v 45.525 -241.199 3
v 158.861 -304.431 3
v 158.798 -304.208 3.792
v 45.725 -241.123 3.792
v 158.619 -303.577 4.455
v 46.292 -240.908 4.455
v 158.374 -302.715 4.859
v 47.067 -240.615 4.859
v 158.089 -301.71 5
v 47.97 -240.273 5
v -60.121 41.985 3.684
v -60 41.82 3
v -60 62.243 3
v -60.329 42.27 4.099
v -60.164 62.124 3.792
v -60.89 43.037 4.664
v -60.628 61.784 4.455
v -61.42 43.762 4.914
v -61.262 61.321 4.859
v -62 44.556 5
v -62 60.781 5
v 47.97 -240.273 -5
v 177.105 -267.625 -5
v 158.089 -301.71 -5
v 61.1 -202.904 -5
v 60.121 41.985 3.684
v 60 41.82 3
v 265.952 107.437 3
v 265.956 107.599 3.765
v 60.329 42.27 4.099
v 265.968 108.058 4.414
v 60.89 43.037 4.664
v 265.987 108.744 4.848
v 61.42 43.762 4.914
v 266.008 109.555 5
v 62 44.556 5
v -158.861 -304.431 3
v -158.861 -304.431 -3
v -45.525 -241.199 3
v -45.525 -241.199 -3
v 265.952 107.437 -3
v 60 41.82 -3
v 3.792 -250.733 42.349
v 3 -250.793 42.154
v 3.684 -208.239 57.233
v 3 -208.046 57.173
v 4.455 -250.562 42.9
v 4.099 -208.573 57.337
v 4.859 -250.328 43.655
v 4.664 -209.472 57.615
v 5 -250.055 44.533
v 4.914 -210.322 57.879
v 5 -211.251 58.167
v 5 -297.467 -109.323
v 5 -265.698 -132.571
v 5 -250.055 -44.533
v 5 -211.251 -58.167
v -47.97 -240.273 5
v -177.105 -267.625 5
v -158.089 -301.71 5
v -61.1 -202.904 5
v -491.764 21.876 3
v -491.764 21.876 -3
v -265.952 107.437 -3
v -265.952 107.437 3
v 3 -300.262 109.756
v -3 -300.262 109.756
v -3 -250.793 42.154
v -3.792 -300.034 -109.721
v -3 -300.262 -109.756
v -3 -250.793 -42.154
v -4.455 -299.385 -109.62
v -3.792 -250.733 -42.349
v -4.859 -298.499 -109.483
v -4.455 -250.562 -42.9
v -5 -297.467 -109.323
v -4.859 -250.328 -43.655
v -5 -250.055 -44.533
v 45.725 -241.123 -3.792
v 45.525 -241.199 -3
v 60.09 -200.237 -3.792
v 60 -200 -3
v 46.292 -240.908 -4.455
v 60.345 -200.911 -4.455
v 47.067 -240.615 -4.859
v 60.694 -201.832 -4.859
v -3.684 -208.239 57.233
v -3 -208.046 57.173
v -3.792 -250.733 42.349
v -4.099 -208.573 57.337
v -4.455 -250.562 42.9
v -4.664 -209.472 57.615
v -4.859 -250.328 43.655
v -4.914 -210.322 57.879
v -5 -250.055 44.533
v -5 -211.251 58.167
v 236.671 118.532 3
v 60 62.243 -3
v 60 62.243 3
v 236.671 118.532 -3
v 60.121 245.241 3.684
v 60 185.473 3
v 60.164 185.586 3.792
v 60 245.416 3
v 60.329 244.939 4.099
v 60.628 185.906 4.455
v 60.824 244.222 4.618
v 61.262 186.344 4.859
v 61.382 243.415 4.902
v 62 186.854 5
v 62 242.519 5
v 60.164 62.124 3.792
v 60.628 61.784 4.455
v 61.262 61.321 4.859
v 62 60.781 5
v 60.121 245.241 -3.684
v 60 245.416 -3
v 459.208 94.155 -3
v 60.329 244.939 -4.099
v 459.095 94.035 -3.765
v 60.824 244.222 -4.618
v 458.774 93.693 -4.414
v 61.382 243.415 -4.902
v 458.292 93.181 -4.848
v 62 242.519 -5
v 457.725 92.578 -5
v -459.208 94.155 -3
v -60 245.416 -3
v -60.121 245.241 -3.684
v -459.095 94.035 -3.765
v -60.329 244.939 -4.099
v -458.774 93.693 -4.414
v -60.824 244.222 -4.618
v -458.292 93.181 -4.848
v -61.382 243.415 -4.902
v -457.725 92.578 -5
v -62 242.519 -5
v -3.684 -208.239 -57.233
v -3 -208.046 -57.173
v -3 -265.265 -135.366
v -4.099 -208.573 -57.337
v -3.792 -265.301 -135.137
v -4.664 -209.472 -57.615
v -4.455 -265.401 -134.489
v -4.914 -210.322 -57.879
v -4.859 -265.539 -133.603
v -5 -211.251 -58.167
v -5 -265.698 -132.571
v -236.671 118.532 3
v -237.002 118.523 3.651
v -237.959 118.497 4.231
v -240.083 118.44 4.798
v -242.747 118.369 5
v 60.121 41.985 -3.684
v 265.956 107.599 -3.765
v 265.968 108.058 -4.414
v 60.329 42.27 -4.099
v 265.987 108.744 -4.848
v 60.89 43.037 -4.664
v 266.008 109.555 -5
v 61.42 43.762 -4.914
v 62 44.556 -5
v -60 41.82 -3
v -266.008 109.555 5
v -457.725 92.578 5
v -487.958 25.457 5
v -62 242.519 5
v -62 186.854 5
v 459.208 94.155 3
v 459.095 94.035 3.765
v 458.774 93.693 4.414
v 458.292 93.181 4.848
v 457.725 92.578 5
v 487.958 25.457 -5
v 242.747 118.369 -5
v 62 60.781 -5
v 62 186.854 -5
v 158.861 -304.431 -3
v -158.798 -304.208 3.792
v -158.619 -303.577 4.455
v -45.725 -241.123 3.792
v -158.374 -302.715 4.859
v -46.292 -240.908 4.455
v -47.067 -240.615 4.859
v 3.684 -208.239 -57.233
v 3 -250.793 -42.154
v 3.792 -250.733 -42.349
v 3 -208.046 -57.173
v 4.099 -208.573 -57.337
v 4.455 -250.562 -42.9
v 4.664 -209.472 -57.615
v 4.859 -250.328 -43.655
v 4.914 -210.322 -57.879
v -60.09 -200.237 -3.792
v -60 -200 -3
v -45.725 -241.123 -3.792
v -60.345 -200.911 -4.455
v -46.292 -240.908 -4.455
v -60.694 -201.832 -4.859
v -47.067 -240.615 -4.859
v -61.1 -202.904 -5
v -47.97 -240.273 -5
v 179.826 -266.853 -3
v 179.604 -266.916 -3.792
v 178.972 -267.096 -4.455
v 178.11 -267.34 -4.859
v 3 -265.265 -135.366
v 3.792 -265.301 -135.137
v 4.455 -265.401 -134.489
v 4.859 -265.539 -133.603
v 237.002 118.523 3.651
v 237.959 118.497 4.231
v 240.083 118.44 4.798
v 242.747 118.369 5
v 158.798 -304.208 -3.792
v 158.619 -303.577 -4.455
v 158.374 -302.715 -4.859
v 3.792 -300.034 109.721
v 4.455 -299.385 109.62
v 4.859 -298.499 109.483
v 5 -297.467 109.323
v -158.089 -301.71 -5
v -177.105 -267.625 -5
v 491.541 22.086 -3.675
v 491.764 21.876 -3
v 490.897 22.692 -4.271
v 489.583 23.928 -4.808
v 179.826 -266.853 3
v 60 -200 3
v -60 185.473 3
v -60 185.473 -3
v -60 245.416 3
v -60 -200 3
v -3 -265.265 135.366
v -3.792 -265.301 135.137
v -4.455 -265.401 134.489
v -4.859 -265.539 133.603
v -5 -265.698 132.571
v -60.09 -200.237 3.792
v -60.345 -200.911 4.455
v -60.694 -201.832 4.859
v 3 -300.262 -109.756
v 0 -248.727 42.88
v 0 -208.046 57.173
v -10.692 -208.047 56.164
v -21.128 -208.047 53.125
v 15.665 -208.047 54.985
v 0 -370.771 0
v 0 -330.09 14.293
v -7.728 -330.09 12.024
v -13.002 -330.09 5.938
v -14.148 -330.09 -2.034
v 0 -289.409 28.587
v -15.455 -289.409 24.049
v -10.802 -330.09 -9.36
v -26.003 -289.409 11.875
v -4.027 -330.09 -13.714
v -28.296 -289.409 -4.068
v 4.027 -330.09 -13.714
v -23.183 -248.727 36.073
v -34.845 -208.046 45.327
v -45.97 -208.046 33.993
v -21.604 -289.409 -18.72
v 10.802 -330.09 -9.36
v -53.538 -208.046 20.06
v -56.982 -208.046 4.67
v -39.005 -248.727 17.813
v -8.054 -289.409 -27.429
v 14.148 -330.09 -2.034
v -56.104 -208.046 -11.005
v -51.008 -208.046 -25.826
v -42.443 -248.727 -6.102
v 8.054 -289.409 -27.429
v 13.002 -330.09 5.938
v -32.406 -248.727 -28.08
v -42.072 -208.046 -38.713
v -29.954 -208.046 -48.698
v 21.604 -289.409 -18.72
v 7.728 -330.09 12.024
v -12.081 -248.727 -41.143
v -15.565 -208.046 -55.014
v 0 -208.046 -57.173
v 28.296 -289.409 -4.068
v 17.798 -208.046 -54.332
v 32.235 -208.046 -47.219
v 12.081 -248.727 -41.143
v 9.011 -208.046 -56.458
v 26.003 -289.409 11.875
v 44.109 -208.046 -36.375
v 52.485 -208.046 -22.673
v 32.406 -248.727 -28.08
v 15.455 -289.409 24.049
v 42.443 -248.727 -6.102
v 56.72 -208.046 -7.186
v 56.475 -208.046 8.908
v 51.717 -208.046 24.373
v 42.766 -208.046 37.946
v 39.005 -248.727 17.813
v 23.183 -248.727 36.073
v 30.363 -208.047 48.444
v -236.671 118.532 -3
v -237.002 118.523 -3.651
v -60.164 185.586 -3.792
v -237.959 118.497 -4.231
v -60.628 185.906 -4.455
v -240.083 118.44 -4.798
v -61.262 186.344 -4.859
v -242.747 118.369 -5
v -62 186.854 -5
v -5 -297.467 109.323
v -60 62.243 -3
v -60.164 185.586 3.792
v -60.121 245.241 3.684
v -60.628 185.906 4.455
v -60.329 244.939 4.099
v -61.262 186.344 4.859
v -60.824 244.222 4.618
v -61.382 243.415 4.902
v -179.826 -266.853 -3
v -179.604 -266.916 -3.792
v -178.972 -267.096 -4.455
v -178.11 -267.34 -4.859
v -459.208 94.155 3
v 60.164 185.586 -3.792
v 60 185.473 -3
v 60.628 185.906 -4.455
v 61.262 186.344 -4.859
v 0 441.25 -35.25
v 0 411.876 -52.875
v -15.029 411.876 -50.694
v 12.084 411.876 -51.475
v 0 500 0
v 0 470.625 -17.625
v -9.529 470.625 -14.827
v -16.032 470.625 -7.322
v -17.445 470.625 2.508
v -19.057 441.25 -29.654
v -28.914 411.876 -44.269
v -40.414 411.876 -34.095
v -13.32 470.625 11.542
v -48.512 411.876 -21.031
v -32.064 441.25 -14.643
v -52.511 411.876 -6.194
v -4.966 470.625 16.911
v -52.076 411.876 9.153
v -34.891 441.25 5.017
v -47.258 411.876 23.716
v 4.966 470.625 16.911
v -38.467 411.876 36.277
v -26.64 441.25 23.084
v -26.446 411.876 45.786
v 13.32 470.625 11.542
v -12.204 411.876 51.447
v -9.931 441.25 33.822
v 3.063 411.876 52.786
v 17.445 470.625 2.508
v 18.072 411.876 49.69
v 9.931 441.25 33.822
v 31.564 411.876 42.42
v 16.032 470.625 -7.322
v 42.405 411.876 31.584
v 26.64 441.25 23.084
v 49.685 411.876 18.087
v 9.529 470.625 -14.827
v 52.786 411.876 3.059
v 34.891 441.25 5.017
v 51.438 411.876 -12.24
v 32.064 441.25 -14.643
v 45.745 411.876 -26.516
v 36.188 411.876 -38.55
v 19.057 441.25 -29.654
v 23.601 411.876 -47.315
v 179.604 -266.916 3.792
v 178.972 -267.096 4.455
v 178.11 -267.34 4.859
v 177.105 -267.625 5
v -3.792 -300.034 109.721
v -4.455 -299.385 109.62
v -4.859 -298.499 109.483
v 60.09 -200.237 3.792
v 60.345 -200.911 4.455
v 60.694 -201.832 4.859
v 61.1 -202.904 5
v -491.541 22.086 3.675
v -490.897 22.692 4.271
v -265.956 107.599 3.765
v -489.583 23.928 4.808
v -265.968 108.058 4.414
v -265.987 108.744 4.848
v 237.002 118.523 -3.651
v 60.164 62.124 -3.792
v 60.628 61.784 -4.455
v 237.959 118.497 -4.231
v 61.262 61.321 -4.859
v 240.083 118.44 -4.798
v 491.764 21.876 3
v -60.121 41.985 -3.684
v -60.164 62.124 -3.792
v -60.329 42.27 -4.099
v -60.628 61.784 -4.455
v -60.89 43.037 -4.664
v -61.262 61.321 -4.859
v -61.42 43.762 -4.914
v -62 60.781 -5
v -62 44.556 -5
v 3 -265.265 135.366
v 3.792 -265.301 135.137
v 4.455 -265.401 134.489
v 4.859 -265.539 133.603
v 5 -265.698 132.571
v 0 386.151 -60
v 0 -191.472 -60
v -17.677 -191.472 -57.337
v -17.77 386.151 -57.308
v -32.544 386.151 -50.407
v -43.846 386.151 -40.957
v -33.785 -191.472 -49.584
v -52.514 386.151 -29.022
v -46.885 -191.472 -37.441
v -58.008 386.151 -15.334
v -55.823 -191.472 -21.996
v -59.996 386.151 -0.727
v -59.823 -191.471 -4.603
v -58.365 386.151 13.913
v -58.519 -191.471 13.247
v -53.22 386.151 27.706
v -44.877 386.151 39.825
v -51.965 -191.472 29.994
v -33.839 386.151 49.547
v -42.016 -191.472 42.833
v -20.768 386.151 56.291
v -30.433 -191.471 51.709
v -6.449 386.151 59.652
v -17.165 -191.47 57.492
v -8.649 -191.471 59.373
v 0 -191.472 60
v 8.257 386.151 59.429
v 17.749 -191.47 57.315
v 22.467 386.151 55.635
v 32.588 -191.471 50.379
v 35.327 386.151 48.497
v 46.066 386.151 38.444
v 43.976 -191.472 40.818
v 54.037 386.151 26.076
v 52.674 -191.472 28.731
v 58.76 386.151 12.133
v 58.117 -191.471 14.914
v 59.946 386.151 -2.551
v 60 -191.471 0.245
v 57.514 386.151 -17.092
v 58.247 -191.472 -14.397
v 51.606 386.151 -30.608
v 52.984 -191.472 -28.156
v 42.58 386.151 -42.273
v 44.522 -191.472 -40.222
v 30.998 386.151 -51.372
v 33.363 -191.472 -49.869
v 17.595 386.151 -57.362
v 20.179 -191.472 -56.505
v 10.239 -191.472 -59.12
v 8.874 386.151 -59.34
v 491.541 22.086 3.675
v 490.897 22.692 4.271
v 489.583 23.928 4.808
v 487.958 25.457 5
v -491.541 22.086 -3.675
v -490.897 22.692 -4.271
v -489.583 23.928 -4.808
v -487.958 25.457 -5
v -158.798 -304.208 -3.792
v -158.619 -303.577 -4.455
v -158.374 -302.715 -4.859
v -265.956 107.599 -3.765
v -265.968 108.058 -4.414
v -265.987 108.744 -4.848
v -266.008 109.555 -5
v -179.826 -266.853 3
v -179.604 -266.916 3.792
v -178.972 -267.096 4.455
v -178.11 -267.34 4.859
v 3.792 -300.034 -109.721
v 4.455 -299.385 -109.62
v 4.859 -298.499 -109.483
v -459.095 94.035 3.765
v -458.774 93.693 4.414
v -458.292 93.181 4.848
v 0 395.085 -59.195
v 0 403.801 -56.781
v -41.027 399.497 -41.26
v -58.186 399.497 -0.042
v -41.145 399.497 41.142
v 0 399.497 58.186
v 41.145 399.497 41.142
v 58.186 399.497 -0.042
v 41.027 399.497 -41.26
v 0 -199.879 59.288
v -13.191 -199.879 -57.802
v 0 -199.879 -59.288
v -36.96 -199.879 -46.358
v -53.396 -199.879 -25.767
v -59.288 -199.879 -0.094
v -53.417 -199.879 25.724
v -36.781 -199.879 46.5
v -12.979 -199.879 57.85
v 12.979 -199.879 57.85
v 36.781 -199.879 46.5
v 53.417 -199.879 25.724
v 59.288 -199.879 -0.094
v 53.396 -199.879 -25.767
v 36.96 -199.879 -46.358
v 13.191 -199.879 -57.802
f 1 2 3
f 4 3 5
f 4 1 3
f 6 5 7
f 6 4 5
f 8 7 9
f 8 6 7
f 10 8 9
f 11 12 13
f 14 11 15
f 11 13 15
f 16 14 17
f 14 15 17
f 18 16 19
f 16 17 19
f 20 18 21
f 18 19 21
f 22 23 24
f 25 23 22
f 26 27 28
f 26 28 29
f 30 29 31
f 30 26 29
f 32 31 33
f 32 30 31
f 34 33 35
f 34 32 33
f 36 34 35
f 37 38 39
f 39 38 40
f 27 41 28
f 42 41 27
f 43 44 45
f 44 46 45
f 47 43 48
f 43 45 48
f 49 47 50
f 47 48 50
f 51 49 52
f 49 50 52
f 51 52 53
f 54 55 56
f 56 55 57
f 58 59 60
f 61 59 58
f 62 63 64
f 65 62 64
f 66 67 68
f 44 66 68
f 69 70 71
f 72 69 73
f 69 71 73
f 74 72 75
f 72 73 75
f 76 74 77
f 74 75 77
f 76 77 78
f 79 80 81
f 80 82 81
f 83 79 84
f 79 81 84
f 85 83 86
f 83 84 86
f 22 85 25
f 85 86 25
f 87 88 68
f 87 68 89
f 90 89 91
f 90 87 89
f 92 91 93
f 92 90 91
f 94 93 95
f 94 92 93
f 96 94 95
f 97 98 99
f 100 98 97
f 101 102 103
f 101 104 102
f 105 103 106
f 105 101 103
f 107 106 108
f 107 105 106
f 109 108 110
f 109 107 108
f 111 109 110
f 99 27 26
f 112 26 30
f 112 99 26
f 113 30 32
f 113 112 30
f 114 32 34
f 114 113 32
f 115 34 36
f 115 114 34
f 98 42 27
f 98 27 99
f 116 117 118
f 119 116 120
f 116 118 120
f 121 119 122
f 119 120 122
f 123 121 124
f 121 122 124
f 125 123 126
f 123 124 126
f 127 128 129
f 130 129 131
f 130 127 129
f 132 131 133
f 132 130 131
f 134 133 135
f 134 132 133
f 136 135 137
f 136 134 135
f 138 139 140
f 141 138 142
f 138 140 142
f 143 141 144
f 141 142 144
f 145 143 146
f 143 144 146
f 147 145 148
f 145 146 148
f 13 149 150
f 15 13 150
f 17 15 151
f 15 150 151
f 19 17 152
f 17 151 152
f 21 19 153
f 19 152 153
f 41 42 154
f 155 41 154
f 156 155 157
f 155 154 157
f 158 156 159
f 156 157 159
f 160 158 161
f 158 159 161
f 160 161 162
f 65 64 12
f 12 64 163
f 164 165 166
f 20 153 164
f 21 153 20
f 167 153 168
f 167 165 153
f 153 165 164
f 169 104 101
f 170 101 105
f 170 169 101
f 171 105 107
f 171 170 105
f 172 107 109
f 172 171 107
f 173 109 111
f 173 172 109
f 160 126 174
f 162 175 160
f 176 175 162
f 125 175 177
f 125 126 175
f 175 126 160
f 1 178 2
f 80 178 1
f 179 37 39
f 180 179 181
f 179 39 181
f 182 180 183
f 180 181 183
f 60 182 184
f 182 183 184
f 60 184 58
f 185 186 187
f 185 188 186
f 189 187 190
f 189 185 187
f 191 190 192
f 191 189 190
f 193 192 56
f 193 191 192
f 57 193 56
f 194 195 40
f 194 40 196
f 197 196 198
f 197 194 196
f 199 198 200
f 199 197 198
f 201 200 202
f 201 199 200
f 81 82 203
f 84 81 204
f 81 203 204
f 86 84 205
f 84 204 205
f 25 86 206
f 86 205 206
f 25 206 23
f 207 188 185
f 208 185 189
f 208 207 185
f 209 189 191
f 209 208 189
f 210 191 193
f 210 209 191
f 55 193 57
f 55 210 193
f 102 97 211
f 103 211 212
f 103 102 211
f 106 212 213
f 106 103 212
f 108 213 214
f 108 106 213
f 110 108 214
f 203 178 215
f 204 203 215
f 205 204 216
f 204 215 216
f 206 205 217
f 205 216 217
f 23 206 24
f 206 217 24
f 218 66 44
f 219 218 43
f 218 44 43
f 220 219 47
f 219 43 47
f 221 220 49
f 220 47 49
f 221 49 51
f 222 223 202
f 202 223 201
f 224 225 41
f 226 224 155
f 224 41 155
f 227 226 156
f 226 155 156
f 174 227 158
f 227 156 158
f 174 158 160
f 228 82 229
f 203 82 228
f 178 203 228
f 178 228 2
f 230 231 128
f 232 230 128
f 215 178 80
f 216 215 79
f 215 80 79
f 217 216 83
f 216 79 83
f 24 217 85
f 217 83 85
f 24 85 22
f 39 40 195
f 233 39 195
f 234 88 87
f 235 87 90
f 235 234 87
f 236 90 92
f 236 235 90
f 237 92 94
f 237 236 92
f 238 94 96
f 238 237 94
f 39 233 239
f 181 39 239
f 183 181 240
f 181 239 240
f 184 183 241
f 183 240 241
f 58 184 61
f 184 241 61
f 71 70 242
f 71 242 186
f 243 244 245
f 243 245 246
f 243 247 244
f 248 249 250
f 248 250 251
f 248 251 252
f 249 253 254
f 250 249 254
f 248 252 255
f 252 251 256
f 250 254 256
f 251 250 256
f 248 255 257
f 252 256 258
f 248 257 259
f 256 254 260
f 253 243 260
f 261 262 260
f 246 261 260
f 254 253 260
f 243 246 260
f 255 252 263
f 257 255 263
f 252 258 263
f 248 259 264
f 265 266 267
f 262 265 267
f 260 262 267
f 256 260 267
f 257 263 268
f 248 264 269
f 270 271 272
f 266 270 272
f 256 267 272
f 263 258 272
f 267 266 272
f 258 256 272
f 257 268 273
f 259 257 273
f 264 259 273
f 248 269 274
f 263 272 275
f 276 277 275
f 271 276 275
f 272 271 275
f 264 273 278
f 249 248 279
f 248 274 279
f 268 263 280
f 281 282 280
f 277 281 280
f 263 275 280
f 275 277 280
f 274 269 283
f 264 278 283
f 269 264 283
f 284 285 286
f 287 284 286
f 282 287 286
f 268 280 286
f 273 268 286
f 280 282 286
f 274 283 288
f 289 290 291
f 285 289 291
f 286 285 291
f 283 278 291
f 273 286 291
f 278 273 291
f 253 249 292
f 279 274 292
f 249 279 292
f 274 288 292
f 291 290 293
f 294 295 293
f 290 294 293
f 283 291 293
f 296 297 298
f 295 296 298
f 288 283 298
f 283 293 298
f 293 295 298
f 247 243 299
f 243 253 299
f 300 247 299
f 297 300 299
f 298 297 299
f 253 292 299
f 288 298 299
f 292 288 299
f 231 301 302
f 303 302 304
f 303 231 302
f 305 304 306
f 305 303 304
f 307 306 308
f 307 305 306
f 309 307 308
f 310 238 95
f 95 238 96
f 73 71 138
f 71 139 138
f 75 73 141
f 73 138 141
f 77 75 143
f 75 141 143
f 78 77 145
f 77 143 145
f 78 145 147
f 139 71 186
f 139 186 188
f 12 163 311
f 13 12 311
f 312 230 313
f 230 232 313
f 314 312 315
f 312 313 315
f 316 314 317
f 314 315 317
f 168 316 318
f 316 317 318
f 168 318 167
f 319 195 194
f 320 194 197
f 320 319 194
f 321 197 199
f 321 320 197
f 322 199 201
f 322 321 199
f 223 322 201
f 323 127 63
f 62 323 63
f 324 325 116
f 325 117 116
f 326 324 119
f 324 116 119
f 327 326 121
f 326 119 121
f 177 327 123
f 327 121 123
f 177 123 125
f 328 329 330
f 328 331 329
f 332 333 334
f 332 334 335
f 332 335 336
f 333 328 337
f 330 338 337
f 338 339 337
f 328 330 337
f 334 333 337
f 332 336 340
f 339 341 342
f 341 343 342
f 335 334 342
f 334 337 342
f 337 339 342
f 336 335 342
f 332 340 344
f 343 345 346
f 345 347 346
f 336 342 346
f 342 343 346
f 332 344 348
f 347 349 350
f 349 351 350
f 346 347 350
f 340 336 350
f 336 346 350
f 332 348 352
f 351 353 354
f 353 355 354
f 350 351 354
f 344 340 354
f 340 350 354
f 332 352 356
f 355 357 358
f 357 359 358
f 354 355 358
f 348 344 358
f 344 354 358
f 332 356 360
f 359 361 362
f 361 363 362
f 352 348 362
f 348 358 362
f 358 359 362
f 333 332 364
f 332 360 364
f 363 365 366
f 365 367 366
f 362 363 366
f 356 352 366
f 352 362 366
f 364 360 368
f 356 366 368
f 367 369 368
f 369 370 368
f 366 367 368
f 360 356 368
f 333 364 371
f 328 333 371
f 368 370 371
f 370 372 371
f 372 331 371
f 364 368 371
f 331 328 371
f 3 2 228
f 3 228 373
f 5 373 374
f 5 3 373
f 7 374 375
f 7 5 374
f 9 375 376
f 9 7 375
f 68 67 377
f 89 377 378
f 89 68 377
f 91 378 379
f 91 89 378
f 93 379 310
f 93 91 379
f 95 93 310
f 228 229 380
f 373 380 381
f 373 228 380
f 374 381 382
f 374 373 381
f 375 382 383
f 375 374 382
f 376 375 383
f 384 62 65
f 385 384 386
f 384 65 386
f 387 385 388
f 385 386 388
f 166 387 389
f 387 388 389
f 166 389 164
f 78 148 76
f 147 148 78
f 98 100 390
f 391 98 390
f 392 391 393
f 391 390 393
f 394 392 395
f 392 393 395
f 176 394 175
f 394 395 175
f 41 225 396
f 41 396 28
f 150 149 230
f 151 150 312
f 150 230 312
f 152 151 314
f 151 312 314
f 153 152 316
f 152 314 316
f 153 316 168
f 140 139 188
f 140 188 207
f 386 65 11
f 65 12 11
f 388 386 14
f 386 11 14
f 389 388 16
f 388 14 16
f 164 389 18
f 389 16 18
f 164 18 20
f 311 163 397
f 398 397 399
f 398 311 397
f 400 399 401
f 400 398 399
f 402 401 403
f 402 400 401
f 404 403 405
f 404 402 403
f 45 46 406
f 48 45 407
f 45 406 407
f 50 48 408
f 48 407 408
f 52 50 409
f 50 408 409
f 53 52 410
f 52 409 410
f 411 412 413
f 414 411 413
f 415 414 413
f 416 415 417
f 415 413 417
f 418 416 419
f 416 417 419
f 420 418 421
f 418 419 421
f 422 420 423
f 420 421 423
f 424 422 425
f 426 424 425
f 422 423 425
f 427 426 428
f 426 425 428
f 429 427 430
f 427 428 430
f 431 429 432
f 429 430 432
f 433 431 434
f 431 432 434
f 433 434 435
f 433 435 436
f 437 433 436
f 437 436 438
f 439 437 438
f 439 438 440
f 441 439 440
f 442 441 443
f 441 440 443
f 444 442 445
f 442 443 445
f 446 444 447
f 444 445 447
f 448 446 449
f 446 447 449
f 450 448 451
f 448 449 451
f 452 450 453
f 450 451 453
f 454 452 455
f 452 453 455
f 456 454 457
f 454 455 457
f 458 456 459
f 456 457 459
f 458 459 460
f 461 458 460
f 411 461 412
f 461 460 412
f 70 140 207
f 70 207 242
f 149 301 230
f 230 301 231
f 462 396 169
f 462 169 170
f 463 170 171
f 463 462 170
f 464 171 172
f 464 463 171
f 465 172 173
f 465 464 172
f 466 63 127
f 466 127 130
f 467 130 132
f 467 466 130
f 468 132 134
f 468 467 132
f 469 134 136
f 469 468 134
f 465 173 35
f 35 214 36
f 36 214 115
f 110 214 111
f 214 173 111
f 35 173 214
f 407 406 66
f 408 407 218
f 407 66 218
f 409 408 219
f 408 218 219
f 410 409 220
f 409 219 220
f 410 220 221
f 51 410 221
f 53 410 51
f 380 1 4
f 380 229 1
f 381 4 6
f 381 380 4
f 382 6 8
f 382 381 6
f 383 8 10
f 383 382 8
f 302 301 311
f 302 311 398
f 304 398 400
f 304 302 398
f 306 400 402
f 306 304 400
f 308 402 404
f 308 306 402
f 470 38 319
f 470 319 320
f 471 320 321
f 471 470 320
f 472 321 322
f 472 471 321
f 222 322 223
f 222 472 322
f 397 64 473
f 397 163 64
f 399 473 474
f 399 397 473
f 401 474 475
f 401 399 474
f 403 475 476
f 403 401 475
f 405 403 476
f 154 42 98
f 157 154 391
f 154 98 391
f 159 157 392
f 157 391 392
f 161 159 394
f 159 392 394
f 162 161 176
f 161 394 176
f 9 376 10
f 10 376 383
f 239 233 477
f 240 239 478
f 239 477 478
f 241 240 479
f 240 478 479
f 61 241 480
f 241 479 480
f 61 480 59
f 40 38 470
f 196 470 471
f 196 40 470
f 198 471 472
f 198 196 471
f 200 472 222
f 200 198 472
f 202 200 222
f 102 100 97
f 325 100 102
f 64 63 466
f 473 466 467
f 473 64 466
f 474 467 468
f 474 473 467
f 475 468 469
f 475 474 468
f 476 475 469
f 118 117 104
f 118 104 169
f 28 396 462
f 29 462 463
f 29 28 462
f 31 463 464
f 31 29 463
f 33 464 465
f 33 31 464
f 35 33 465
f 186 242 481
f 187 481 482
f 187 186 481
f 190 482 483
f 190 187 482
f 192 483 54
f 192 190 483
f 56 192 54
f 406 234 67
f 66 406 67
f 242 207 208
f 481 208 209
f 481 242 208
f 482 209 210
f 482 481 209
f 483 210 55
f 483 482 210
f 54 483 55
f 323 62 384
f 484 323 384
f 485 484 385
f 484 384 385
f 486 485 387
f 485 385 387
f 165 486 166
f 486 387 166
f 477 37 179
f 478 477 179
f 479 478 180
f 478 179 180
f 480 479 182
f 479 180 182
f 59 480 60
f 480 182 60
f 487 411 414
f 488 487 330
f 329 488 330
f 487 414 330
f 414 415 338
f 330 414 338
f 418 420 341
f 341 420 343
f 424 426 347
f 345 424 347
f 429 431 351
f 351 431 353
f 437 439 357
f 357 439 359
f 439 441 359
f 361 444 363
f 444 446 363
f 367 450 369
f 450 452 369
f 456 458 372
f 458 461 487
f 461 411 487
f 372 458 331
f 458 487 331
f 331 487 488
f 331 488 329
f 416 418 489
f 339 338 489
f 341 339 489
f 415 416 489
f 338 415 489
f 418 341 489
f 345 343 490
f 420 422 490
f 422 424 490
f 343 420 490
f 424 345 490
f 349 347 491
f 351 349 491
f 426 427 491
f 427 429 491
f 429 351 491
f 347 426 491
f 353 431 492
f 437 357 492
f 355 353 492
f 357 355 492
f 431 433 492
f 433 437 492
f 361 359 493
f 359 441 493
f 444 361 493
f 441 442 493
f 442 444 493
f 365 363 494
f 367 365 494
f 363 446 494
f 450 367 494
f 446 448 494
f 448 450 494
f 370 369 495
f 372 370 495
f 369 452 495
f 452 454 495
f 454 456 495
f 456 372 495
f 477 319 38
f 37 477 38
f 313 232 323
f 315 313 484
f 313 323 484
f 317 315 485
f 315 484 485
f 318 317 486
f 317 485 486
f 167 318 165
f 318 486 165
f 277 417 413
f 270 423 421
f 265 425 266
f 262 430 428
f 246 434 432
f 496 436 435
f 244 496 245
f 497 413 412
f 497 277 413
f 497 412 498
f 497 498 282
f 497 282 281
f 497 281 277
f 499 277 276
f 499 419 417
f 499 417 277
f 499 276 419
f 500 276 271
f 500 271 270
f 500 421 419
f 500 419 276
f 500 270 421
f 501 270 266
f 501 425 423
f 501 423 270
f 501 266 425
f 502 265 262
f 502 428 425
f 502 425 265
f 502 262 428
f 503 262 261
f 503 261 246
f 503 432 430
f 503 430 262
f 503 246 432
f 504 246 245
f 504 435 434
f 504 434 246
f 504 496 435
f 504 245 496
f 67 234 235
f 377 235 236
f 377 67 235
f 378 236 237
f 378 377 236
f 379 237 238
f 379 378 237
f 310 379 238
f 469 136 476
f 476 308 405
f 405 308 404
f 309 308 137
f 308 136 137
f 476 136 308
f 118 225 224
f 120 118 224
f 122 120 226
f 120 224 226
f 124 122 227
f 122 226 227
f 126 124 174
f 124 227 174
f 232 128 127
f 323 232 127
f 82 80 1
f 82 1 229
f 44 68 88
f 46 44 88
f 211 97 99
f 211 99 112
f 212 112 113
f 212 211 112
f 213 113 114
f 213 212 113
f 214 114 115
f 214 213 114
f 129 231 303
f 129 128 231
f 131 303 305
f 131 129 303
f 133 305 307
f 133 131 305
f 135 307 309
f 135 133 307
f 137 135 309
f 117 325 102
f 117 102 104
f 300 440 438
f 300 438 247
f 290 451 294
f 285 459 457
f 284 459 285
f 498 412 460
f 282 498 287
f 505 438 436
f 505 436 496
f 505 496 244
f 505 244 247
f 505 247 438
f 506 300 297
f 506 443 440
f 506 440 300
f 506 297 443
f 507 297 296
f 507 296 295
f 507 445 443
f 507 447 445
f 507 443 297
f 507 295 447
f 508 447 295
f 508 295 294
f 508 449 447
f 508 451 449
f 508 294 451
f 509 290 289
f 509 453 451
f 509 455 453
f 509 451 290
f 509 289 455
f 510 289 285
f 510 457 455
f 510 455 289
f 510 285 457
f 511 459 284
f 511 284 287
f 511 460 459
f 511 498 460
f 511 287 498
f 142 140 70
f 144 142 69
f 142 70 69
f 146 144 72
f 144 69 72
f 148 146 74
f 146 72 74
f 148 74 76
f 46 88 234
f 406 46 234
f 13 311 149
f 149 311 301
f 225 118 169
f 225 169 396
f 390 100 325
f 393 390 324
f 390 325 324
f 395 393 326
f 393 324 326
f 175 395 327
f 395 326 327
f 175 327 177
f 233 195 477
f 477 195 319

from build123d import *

# Parameters (mm, degrees)
EXTRUDE_1_DEPTH        = 5
EXTRUDE_1_DEPTH_BACK   = 5
EXTRUDE_1_2_DEPTH      = 5
EXTRUDE_1_2_DEPTH_BACK = 5
EXTRUDE_2_DEPTH        = 5
EXTRUDE_2_DEPTH_BACK   = 5
EXTRUDE_2_2_DEPTH      = 5
EXTRUDE_2_2_DEPTH_BACK = 5
FILLET_1_R             = 2
FILLET_2_R             = 2
FILLET_3_R             = 2
FILLET_4_R             = 2
FILLET_5_R             = 50
FILLET_6_R             = 50
EXTRUDE_3_DEPTH        = 5
EXTRUDE_3_DEPTH_BACK   = 5
EXTRUDE_3_2_DEPTH      = 5
EXTRUDE_3_2_DEPTH_BACK = 5
FILLET_7_R             = 2
FILLET_8_R             = 2


with BuildPart() as part:
    # 草图2 → 旋转1 (revolve)
    with BuildSketch(Plane.XY):
        Polygon((0, 0), (0, 500), (60, 400), (60, -200), (0, -200), align=None)
    revolve(axis=Axis((0, 0, 0), (0, 1, 0)))

    # 草图5 → 旋转2 (revolve)
    with BuildSketch(Plane.XY):
        Polygon((0, -200), (0, -370.771320176), (-60, -200), align=None)
    revolve(axis=Axis((0, -200, 0), (0, -1, 0)))

    # 圆角5
    fillet_5_edges = [part.edges().sort_by_distance(p)[0] for p in [
        (-60, 400, 0),
    ]]
    fillet(fillet_5_edges, radius=FILLET_5_R)

    # 圆角6
    fillet_6_edges = [part.edges().sort_by_distance(p)[0] for p in [
        (0, -200, -60),
    ]]
    fillet(fillet_6_edges, radius=FILLET_6_R)


with BuildPart() as body_2:
    # 草图3 → 凸台-拉伸1 (new, two sides: drawn at the far end of the back side and taken through both)
    with BuildSketch(Plane.XY.offset(-EXTRUDE_1_DEPTH_BACK)):
        Polygon((-60, 245.415694678), (-459.20797539, 94.15469375), (-491.764180738, 21.876413004), (-265.951571519, 107.437432317), (-60, 41.819663893), (-60, 62.243090179), (-236.671114858, 118.531877958), (-60, 185.473049767), align=None)
    extrude(amount=EXTRUDE_1_DEPTH + EXTRUDE_1_DEPTH_BACK)

    # 圆角1
    fillet_1_edges = [body_2.edges().sort_by_distance(p)[0] for p in [
        (-148.335557429, 152.002463863, 5),
        (-148.335557429, 90.387484068, 5),
        (-60, 52.031377036, 5),
        (-162.97578576, 74.628548105, 5),
        (-378.857876129, 64.65692266, 5),
        (-475.486078064, 58.015553377, 5),
        (-259.603987695, 169.785194214, 5),
        (-60, 215.444372223, 5),
        (-259.603987695, 169.785194214, -5),
        (-475.486078064, 58.015553377, -5),
        (-378.857876129, 64.65692266, -5),
        (-162.97578576, 74.628548105, -5),
        (-60, 52.031377036, -5),
        (-148.335557429, 90.387484068, -5),
        (-148.335557429, 152.002463863, -5),
        (-60, 215.444372223, -5),
    ]]
    fillet(fillet_1_edges, radius=FILLET_1_R)


with BuildPart() as body_3:
    # 草图3 → Extrude 1 2 (new, two sides: drawn at the far end of the back side and taken through both)
    with BuildSketch(Plane.XY.offset(-EXTRUDE_1_2_DEPTH_BACK)):
        Polygon((265.951571519, 107.437432317), (60, 41.819663893), (60, 62.243090179), (236.671114858, 118.531877958), (60, 185.473049767), (60, 245.415694678), (459.20797539, 94.15469375), (491.764180738, 21.876413004), align=None)
    extrude(amount=EXTRUDE_1_2_DEPTH + EXTRUDE_1_2_DEPTH_BACK)

    # 圆角2
    fillet_2_edges = [body_3.edges().sort_by_distance(p)[0] for p in [
        (475.486078064, 58.015553377, -5),
        (259.603987695, 169.785194214, -5),
        (60, 215.444372223, -5),
        (148.335557429, 152.002463863, -5),
        (148.335557429, 90.387484068, -5),
        (60, 52.031377036, -5),
        (162.97578576, 74.628548105, -5),
        (378.857876129, 64.65692266, -5),
        (162.97578576, 74.628548105, 5),
        (60, 52.031377036, 5),
        (148.335557429, 90.387484068, 5),
        (148.335557429, 152.002463863, 5),
        (60, 215.444372223, 5),
        (259.603987695, 169.785194214, 5),
        (475.486078064, 58.015553377, 5),
        (378.857876129, 64.65692266, 5),
    ]]
    fillet(fillet_2_edges, radius=FILLET_2_R)


with BuildPart() as body_4:
    # 草图6 → 凸台-拉伸2 (new, two sides: drawn at the far end of the back side and taken through both)
    with BuildSketch(Plane.XY.offset(-EXTRUDE_2_DEPTH_BACK)):
        Polygon((-60, -200), (-179.826175062, -266.853333767), (-158.860871533, -304.430998026), (-45.524956299, -241.198705374), align=None)
    extrude(amount=EXTRUDE_2_DEPTH + EXTRUDE_2_DEPTH_BACK)

    # 圆角4
    fillet_4_edges = [body_4.edges().sort_by_distance(p)[0] for p in [
        (-119.913087531, -233.426666884, -5),
        (-169.343523297, -285.642165897, -5),
        (-102.192913916, -272.8148517, -5),
        (-52.76247815, -220.599352687, -5),
        (-102.192913916, -272.8148517, 5),
        (-169.343523297, -285.642165897, 5),
        (-119.913087531, -233.426666884, 5),
        (-52.76247815, -220.599352687, 5),
    ]]
    fillet(fillet_4_edges, radius=FILLET_4_R)


with BuildPart() as body_5:
    # 草图6 → Extrude 2 2 (new, two sides: drawn at the far end of the back side and taken through both)
    with BuildSketch(Plane.XY.offset(-EXTRUDE_2_2_DEPTH_BACK)):
        Polygon((158.860871533, -304.430998026), (45.524956299, -241.198705374), (60, -200), (179.826175062, -266.853333767), align=None)
    extrude(amount=EXTRUDE_2_2_DEPTH + EXTRUDE_2_2_DEPTH_BACK)

    # 圆角3
    fillet_3_edges = [body_5.edges().sort_by_distance(p)[0] for p in [
        (102.192913916, -272.8148517, 5),
        (52.76247815, -220.599352687, 5),
        (119.913087531, -233.426666884, 5),
        (169.343523297, -285.642165897, 5),
        (119.913087531, -233.426666884, -5),
        (52.76247815, -220.599352687, -5),
        (102.192913916, -272.8148517, -5),
        (169.343523297, -285.642165897, -5),
    ]]
    fillet(fillet_3_edges, radius=FILLET_3_R)


with BuildPart() as body_6:
    # 草图7 → 凸台-拉伸3 (new, two sides: drawn at the far end of the back side and taken through both)
    with BuildSketch(Plane(origin=(0, 0, 0), x_dir=(0, 0, -1), z_dir=(1, 0, 0)).offset(-EXTRUDE_3_DEPTH_BACK)):
        Polygon((-57.173070403, -208.045974988), (-135.365840389, -265.265464672), (-109.756025707, -300.262322558), (-42.154059128, -250.792914709), align=None)
    extrude(amount=EXTRUDE_3_DEPTH + EXTRUDE_3_DEPTH_BACK)

    # 圆角7
    fillet_7_edges = [body_6.edges().sort_by_distance(p)[0] for p in [
        (5, -275.527618634, 75.955042417),
        (5, -282.763893615, 122.560933048),
        (5, -236.65571983, 96.269455396),
        (5, -229.419444849, 49.663564765),
        (-5, -236.65571983, 96.269455396),
        (-5, -282.763893615, 122.560933048),
        (-5, -275.527618634, 75.955042417),
        (-5, -229.419444849, 49.663564765),
    ]]
    fillet(fillet_7_edges, radius=FILLET_7_R)


with BuildPart() as body_7:
    # 草图7 → Extrude 3 2 (new, two sides: drawn at the far end of the back side and taken through both)
    with BuildSketch(Plane(origin=(0, 0, 0), x_dir=(0, 0, -1), z_dir=(1, 0, 0)).offset(-EXTRUDE_3_2_DEPTH_BACK)):
        Polygon((109.756025707, -300.262322558), (42.154059128, -250.792914709), (57.173070403, -208.045974988), (135.365840389, -265.265464672), align=None)
    extrude(amount=EXTRUDE_3_2_DEPTH + EXTRUDE_3_2_DEPTH_BACK)

    # 圆角8
    fillet_8_edges = [body_7.edges().sort_by_distance(p)[0] for p in [
        (-5, -236.65571983, -96.269455396),
        (-5, -229.419444849, -49.663564765),
        (-5, -275.527618634, -75.955042417),
        (-5, -282.763893615, -122.560933048),
        (5, -275.527618634, -75.955042417),
        (5, -229.419444849, -49.663564765),
        (5, -236.65571983, -96.269455396),
        (5, -282.763893615, -122.560933048),
    ]]
    fillet(fillet_8_edges, radius=FILLET_8_R)


solid = Compound([part.part, body_2.part, body_3.part, body_4.part, body_5.part, body_6.part, body_7.part])
